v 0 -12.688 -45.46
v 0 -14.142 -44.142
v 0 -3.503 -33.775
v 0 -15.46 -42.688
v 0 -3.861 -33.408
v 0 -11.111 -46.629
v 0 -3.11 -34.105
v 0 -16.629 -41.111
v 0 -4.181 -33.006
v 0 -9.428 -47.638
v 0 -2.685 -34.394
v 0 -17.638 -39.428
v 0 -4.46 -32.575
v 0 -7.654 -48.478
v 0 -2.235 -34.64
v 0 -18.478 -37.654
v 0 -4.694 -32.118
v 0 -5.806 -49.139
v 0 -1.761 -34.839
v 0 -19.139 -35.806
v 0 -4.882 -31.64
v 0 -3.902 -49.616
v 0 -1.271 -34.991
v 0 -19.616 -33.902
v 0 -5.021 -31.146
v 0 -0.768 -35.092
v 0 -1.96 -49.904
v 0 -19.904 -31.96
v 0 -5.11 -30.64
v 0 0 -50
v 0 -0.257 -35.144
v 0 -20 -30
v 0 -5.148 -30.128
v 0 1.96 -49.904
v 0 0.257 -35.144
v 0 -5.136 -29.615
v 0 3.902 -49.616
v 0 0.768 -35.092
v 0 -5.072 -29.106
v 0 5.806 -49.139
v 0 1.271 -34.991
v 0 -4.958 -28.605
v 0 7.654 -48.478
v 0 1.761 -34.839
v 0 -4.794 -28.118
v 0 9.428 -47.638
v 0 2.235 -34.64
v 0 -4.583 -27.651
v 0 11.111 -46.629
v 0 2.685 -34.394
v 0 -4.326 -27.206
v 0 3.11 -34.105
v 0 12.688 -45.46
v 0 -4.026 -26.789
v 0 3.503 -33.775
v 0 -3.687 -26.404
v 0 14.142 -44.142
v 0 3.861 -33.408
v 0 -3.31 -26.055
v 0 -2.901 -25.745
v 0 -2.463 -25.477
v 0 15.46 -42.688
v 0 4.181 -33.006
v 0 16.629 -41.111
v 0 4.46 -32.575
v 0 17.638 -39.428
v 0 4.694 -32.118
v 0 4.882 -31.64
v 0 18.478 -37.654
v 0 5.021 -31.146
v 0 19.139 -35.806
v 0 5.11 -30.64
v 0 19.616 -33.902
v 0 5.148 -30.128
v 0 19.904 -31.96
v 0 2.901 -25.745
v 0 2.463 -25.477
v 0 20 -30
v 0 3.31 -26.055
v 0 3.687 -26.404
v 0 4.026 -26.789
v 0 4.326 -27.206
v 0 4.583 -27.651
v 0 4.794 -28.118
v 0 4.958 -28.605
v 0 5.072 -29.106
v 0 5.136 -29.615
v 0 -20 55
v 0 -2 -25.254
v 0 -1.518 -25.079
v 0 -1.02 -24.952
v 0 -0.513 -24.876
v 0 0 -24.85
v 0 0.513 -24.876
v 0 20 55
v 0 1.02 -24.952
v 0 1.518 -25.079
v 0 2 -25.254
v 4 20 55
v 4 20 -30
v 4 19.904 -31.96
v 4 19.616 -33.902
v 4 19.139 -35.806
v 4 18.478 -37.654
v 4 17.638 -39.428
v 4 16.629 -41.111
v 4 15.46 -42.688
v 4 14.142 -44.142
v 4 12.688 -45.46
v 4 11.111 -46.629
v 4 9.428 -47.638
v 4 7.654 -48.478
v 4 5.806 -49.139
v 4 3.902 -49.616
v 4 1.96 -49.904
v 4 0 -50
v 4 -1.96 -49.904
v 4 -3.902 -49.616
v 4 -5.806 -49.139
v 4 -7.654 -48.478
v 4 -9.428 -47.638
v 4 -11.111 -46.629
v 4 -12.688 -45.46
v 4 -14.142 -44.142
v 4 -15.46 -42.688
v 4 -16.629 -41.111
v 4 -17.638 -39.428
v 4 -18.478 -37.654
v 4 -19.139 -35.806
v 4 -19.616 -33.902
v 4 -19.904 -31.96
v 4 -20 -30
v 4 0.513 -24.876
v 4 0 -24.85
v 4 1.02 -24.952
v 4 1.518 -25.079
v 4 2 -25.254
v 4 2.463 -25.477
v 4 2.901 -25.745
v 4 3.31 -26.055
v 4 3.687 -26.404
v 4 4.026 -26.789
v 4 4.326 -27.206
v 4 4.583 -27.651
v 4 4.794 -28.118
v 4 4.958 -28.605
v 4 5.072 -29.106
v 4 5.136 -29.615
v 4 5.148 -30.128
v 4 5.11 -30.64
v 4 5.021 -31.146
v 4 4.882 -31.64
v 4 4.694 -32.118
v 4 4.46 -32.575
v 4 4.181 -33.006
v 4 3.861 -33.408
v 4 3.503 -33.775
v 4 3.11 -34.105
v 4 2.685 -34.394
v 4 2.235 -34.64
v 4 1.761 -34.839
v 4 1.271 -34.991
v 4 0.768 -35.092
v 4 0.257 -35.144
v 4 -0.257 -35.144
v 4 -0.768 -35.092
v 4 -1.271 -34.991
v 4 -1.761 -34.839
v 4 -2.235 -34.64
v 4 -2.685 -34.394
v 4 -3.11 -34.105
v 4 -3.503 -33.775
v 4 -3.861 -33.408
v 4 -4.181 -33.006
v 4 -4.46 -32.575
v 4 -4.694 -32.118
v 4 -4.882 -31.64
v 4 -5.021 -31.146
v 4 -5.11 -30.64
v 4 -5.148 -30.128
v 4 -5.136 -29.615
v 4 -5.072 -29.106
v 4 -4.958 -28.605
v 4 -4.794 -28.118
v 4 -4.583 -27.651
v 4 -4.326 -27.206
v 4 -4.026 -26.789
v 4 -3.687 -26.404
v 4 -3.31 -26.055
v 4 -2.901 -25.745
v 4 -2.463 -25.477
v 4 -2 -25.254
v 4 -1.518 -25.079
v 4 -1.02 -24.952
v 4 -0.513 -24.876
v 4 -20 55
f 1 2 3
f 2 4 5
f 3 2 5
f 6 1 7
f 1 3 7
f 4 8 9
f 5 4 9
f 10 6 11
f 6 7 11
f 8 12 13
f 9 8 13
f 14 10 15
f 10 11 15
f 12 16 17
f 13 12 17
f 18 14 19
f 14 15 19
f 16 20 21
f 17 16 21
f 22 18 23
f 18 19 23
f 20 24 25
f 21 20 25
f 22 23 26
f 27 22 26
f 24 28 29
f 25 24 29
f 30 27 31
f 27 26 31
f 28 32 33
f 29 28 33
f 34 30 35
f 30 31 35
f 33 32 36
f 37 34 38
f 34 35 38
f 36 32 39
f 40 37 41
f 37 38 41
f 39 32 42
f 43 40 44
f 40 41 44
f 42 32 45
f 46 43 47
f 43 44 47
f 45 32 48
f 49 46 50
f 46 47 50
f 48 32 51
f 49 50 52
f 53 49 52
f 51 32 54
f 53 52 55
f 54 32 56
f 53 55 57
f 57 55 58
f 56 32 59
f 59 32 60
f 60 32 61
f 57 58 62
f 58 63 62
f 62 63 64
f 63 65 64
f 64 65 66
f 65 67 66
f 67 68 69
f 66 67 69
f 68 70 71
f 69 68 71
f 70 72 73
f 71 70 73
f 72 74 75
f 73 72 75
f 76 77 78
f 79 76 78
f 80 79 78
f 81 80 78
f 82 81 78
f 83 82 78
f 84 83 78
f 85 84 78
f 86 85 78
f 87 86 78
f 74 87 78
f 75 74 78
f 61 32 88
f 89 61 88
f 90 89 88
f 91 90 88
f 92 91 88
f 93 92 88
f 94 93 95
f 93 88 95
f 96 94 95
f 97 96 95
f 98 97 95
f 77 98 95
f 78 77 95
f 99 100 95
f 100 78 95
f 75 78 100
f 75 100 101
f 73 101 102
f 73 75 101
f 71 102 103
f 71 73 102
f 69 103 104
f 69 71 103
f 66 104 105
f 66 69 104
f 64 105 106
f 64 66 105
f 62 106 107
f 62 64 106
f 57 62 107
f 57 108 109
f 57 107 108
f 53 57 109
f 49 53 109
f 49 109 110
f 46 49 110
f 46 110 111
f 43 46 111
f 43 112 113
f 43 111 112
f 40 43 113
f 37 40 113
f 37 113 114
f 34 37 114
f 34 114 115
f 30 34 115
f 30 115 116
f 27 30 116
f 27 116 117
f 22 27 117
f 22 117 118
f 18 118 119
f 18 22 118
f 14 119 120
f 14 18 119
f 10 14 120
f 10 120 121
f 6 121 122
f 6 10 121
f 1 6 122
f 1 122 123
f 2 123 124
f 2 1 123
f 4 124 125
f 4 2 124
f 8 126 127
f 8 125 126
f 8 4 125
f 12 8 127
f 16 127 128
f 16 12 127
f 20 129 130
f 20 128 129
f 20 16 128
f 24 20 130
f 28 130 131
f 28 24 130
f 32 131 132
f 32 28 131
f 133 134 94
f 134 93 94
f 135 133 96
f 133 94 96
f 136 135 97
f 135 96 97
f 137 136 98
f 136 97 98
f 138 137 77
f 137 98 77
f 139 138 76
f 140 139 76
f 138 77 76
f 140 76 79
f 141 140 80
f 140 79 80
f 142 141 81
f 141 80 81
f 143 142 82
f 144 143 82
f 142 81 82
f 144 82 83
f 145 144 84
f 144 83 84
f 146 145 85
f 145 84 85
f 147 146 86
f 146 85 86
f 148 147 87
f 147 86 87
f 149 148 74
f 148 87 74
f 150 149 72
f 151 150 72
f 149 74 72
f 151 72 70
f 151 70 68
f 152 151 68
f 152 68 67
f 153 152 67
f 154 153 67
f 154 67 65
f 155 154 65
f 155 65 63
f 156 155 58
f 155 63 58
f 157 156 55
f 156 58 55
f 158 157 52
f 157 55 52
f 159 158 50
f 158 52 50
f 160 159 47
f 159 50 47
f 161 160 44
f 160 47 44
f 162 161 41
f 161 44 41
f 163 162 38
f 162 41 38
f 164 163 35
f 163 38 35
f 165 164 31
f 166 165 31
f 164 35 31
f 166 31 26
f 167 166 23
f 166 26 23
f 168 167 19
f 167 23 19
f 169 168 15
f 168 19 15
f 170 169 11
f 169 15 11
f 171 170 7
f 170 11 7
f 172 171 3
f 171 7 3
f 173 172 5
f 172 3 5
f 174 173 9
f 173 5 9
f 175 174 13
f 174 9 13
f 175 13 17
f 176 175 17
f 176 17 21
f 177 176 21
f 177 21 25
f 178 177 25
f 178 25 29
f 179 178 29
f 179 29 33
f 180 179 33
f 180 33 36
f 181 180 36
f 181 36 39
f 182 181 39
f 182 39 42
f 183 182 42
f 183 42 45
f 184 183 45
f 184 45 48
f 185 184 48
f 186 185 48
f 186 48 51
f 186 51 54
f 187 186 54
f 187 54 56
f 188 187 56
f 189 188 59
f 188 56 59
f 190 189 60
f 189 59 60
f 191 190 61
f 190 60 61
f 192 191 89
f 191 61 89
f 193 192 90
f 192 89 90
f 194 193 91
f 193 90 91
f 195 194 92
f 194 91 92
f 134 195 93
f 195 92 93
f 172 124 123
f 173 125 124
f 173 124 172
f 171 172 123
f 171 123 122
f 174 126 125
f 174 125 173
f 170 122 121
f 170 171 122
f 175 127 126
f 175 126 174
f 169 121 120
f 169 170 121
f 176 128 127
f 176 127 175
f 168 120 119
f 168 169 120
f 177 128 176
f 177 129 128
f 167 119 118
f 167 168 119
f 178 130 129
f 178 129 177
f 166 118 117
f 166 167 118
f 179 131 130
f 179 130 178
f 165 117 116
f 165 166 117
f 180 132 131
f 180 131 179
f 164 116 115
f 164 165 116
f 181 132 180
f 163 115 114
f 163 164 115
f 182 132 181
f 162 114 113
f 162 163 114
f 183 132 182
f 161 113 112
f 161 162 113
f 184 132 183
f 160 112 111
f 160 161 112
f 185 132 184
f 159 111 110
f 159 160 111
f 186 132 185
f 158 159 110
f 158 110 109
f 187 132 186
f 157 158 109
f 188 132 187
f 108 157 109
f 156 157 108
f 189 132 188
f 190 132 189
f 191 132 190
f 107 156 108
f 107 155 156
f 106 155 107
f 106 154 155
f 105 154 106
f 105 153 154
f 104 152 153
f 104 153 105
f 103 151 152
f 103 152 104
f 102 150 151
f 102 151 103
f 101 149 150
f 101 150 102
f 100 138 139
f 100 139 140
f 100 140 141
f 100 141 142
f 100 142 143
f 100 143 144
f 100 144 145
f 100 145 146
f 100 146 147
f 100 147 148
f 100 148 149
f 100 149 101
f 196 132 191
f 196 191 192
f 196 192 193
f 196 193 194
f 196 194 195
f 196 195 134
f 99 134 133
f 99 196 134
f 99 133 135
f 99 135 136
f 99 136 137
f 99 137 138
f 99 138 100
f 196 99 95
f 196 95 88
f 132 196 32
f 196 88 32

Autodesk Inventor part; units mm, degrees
ref_plane "YZ Plane" through (0, 0, 0) normal (1, 0, 0) x (0, 1, 0)
ref_plane "XZ Plane" through (0, 0, 0) normal (0, 1, 0) x (-1, 0, 0)
ref_plane "XY Plane" through (0, 0, 0) normal (0, 0, 1) x (1, 0, 0)
sketch "Sketch1" plane through (0, 0, 0) normal (1, 0, 0) x (0, 1, 0)
  line L0 (-20, -30) -> (20, -30)
  line L1 (20, -30) -> (20, 30)
  line L2 (20, 30) -> (-20, 30)
  line L3 (-20, 30) -> (-20, -30)
  line L4 (-20, -30) -> (20, 30) construction
  line L5 (20, -30) -> (-20, 30) construction
  circle A0 centre (0, -30) radius 20
  point P0 (0, 0)
  dimension "d0" = 40
  dimension "d1" = 60
extrude "Extrusion1" add sketch "Sketch1" along normal blind 4
sketch "Sketch4" plane through (4, 0, 0) normal (1, 0, 0) x (0, 0, -1)
  line L0 (-5, 20) -> (-55, 20)
  line L1 (-55, 20) -> (-55, -20)
  line L2 (-55, -20) -> (-5, -20)
  line L3 (-5, -20) -> (-5, 20)
  line L4 (-5, -104.205) -> (-5, 91.5035)
  line L5 (0, -143.3467) -> (0, 130.6452) projected
  line L6 (30, 20) -> (-30, 20) projected
  dimension "d40" = 50
  dimension "d41" = 40
  dimension "d49" = 5
  dimension "d50" = 0
  dimension "d52" = 0
extrude "Extrusion4" add sketch "Sketch4" against normal blind 4
sketch "Sketch2" plane through (0, 0, 0) normal (-1, 0, 0) x (0, 0, 1)
  arc A0 (-30, 20) -> (-30, -20) centre (-30, 0) ccw projected
  circle A1 centre (-30, 0) radius 5.15
  point P0 (0, 0)
  dimension "d4" = 10.3
extrude "Extrusion2" cut sketch "Sketch2" against normal blind 4
properties part number "houder"
